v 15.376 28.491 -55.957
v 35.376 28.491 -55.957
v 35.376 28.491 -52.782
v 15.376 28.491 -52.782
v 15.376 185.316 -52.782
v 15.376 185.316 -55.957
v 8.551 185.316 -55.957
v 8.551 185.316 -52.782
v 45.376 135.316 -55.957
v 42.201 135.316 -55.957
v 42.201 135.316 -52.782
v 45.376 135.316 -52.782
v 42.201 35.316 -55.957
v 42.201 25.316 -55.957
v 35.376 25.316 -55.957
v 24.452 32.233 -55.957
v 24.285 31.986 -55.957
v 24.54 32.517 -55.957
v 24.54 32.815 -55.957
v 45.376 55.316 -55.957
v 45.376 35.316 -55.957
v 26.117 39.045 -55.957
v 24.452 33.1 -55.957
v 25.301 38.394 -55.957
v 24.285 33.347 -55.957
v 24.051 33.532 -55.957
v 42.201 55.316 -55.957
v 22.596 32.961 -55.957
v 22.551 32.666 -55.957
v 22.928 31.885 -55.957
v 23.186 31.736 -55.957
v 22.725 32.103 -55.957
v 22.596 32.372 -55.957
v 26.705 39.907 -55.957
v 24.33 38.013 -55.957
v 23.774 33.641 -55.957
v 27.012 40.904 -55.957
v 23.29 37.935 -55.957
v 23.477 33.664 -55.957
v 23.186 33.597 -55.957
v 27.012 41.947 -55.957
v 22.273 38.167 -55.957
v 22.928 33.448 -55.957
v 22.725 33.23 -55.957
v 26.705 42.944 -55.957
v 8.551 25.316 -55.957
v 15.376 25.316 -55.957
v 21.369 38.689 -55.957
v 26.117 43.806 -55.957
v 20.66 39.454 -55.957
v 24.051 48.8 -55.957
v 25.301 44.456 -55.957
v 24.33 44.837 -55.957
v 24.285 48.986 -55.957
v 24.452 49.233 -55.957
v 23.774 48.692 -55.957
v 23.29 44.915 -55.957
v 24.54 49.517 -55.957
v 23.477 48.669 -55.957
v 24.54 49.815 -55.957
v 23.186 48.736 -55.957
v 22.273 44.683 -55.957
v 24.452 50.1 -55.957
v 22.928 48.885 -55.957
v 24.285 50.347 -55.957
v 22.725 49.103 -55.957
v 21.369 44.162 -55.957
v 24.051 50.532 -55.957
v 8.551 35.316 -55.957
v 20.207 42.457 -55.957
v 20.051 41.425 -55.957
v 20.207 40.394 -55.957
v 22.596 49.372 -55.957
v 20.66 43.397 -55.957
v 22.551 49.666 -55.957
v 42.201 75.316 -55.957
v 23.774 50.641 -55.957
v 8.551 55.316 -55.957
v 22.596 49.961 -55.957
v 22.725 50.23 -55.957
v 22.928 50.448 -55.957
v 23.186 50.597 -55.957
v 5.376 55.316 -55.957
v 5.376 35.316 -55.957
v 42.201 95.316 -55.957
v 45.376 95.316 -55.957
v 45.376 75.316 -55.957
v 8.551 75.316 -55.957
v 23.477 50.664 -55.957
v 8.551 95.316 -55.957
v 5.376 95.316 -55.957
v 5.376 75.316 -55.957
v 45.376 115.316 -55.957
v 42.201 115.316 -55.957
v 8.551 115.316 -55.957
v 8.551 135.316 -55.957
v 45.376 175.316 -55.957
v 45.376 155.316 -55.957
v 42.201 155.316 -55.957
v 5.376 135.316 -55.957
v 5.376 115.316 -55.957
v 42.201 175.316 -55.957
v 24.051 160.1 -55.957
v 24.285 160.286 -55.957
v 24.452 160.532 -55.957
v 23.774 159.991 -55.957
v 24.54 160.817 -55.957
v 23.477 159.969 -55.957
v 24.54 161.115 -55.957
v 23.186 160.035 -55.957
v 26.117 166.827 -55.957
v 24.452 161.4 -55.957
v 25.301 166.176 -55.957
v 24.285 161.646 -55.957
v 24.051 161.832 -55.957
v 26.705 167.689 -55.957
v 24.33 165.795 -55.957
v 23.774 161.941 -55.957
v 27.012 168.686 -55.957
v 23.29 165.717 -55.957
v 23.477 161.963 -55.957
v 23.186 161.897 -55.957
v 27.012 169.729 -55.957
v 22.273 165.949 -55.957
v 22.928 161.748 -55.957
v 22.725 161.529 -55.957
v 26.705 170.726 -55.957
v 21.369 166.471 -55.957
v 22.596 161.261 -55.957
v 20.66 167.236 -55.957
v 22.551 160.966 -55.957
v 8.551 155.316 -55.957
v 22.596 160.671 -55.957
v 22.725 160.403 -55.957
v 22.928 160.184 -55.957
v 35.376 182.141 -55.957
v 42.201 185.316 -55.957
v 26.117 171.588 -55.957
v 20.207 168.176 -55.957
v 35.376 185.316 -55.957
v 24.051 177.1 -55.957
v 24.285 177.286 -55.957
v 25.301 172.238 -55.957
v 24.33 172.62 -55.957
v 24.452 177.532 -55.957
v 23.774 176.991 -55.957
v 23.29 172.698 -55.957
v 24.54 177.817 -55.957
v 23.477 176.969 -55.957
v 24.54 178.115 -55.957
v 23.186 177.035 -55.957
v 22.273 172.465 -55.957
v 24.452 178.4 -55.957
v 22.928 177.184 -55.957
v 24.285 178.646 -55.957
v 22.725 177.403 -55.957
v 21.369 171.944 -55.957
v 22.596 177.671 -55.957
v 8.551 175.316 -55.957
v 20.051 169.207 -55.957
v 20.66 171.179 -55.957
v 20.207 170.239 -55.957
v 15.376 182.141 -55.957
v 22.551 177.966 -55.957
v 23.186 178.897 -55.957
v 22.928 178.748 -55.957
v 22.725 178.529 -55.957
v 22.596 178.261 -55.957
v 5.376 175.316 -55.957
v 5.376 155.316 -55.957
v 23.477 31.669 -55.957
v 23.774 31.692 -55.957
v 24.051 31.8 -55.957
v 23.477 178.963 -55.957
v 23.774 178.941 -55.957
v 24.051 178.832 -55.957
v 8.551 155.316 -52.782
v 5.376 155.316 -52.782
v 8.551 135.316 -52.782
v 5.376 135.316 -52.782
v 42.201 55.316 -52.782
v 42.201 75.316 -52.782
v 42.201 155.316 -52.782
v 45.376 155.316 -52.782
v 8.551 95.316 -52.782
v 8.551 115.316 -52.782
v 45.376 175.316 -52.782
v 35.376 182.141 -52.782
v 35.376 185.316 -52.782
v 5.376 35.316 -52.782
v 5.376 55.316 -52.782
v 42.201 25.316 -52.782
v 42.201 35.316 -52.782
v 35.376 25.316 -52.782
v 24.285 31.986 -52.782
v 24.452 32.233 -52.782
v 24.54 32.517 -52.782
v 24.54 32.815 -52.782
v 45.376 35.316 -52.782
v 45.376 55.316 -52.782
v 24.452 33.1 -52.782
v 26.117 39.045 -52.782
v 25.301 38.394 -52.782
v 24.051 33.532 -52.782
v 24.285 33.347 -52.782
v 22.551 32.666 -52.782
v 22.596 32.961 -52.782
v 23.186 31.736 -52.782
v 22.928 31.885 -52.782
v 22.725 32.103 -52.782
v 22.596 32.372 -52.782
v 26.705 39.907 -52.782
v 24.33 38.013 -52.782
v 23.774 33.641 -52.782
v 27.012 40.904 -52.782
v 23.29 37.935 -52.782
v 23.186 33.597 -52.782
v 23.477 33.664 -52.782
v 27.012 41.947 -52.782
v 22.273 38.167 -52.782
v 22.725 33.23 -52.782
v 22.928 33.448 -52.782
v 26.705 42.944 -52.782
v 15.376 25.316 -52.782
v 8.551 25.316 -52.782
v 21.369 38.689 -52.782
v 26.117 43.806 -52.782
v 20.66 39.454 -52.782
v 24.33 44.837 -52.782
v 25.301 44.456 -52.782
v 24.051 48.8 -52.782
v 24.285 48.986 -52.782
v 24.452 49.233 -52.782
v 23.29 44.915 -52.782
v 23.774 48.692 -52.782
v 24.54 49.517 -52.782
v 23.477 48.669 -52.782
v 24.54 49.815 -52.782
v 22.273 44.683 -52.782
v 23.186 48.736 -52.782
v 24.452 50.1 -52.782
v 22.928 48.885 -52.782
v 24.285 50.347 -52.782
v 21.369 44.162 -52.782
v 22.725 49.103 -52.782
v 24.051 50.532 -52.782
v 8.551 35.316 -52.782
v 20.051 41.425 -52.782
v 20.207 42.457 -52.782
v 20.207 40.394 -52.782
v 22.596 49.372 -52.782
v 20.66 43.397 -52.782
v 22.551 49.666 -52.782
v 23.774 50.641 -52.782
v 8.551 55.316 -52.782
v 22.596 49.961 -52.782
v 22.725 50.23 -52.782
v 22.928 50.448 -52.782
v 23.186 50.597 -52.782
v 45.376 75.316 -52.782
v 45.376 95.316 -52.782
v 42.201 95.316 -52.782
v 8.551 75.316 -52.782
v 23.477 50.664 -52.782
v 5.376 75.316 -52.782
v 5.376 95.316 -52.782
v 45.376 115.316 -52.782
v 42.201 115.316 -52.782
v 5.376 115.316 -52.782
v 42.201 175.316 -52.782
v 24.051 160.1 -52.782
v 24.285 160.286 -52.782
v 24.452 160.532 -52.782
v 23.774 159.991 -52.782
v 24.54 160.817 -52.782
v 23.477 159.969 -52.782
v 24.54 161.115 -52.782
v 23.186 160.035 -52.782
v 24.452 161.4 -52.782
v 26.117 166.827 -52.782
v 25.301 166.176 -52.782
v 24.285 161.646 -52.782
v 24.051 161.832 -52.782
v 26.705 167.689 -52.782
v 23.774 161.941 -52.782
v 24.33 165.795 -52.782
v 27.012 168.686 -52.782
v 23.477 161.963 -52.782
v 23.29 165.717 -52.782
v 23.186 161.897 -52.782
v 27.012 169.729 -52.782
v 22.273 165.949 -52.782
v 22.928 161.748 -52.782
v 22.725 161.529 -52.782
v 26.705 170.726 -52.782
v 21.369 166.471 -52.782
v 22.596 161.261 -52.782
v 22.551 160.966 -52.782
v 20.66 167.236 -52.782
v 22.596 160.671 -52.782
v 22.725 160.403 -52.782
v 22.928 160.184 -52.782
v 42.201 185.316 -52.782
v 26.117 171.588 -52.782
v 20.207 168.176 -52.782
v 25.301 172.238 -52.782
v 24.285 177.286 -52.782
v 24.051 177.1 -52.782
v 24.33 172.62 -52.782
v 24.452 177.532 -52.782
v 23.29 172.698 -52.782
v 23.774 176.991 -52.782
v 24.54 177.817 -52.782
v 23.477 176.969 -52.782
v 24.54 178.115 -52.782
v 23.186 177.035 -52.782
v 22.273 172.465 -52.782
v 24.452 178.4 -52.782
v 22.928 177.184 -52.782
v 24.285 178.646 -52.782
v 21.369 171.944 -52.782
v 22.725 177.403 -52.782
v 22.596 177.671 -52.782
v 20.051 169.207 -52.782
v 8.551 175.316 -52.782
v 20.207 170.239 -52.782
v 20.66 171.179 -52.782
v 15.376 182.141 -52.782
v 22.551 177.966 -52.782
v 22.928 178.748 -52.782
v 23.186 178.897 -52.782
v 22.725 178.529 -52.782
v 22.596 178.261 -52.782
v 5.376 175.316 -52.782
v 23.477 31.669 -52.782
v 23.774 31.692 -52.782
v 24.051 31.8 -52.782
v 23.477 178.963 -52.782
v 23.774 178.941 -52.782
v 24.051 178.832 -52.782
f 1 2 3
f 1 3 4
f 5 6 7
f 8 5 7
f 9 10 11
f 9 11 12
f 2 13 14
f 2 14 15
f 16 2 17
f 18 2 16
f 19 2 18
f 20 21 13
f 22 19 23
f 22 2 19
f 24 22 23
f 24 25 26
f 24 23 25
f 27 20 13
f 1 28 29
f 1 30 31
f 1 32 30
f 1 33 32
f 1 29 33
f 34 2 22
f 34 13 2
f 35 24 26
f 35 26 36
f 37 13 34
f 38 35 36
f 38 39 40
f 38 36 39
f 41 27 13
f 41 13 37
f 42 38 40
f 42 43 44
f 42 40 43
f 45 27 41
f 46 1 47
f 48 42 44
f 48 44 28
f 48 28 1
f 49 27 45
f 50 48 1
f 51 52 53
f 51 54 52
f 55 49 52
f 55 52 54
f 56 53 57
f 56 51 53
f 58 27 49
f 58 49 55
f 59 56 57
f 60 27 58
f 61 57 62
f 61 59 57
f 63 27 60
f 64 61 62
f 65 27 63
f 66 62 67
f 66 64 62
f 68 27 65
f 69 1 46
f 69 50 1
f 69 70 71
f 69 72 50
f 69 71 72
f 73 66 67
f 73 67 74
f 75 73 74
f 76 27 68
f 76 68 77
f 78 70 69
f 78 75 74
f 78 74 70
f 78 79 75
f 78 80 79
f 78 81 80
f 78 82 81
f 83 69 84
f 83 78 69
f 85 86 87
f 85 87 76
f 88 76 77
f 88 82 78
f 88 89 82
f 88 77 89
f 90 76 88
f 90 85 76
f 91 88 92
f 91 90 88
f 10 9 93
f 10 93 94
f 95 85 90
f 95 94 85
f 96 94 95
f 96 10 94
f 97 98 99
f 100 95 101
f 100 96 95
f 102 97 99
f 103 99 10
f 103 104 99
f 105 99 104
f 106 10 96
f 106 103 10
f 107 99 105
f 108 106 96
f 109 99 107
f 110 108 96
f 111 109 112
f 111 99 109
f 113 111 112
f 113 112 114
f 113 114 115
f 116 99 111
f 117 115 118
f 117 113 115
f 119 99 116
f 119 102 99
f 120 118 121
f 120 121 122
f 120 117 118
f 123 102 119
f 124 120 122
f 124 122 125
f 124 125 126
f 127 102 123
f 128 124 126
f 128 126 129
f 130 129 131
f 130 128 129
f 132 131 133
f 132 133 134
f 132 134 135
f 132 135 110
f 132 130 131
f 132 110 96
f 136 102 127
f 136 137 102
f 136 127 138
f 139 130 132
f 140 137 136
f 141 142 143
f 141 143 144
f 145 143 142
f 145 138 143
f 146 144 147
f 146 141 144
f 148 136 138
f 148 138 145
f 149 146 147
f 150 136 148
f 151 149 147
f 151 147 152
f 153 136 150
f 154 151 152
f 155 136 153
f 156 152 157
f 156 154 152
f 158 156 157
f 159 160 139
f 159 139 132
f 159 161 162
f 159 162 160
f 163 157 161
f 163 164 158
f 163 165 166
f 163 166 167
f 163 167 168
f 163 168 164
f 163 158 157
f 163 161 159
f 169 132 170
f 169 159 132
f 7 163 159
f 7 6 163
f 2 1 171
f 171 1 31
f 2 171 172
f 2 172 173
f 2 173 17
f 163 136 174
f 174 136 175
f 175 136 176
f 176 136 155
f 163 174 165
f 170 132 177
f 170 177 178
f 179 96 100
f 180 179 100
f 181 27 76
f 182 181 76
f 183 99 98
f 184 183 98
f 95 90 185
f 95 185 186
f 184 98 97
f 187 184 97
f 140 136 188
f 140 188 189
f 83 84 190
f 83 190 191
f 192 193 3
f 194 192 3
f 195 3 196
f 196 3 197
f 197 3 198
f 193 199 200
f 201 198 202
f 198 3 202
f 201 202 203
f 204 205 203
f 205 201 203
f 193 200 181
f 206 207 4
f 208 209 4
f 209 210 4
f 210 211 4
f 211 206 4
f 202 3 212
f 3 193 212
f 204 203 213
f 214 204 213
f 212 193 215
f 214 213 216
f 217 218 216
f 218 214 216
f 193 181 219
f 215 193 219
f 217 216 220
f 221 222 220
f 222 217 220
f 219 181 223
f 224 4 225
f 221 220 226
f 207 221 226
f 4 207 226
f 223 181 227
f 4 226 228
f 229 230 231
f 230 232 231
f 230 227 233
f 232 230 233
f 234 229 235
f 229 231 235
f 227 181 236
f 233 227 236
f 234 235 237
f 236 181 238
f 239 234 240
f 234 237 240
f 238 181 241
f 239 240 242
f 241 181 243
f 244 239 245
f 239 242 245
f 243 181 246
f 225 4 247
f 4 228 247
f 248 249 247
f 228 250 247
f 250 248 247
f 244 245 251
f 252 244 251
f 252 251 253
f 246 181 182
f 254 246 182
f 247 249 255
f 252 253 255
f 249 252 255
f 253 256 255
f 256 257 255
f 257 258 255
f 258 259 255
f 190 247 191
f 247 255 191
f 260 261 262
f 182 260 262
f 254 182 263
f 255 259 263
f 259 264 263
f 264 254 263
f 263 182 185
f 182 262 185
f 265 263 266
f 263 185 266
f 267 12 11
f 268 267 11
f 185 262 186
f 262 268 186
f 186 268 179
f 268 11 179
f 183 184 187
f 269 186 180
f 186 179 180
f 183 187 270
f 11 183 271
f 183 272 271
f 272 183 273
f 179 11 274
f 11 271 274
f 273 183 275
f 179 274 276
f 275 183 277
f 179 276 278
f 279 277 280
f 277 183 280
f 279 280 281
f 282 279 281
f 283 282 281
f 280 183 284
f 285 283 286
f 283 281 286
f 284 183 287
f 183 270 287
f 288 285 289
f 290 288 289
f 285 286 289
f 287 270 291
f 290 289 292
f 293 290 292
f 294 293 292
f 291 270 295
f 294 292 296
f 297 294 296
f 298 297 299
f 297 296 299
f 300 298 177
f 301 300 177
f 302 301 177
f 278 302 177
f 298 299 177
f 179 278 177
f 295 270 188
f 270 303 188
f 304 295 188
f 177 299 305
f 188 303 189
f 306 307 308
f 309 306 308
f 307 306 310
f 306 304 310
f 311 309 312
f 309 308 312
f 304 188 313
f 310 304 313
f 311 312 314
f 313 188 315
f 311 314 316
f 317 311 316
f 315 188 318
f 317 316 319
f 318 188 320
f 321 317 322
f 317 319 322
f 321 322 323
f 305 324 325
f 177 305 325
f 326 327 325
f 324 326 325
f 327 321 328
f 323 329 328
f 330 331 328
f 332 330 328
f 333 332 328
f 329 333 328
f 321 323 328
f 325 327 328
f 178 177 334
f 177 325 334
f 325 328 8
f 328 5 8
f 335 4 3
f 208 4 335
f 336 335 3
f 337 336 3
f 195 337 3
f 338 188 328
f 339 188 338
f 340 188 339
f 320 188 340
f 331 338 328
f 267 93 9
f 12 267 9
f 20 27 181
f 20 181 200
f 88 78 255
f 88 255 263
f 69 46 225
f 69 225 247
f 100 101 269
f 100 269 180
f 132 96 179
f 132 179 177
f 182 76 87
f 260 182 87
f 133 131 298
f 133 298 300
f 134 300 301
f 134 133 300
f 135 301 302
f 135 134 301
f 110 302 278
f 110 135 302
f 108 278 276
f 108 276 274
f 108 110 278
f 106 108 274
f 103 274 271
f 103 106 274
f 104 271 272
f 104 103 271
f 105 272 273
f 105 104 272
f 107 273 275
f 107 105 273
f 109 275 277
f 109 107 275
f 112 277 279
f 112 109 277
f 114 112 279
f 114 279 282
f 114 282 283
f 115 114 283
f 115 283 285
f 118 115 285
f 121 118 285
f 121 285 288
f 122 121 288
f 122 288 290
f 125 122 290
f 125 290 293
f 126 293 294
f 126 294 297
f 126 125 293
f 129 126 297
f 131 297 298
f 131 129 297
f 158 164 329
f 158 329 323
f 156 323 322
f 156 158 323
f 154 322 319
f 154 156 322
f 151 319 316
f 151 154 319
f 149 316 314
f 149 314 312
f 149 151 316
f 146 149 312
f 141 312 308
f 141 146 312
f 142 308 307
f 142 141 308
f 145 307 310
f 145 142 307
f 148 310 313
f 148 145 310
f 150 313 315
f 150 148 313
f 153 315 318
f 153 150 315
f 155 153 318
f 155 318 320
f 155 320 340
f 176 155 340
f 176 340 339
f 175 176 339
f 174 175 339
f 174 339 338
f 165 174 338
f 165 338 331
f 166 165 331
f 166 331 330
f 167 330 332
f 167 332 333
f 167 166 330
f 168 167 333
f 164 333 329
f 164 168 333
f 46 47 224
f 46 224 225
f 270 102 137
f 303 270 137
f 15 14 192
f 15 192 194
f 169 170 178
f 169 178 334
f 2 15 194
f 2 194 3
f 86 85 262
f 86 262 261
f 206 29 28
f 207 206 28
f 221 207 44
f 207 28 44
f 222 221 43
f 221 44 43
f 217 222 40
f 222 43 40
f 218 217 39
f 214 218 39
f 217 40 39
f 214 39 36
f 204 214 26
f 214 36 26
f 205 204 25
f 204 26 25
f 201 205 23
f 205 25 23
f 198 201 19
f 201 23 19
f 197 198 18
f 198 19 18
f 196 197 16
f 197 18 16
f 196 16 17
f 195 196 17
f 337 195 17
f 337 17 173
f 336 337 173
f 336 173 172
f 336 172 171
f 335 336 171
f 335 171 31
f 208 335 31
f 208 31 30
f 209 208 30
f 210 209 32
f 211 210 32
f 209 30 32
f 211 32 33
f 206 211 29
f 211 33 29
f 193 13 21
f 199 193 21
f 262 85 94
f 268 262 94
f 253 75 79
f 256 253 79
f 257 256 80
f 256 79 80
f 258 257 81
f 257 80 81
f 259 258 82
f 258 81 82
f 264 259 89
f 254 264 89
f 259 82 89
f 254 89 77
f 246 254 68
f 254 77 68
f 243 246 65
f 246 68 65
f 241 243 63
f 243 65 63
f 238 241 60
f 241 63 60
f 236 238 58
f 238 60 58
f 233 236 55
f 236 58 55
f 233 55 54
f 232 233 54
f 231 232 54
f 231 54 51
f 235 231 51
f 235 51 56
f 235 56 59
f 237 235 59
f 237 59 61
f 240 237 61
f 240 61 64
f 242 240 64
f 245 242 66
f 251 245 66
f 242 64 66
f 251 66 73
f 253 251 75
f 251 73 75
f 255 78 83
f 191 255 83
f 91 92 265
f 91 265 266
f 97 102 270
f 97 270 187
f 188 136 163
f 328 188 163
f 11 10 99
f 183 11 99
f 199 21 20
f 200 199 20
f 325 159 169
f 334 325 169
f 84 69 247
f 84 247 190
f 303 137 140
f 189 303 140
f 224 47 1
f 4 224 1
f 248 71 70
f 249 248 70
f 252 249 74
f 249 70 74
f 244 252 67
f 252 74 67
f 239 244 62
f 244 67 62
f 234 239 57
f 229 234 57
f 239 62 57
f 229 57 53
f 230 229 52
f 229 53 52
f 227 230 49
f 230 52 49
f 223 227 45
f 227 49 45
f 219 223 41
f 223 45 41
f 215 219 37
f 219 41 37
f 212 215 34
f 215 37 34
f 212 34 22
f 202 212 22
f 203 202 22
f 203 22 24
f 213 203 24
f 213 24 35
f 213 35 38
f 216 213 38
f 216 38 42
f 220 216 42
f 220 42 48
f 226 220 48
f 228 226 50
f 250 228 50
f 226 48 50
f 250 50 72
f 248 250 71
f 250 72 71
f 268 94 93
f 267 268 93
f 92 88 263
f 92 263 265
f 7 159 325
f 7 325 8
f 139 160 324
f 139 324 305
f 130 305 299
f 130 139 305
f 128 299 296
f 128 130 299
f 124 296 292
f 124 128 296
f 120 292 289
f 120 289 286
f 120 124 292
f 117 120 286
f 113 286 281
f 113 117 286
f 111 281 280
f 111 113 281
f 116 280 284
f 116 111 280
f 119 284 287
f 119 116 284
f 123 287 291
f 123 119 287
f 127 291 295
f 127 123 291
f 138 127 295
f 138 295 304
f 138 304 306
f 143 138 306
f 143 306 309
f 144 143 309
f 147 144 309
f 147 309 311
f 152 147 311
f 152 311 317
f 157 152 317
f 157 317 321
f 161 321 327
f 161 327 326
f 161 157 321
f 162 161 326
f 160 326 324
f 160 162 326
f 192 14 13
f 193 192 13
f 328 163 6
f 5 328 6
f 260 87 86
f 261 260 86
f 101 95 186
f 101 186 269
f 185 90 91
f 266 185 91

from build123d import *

# Parameters (mm, degrees)
SKETCH1_W           = 40
SKETCH1_H           = 160
BOSS_EXTRUDE1_DEPTH = 3.175
SKETCH2_W           = 3.175
SKETCH2_H           = 10
SKETCH2_H_2         = 20
CUT_EXTRUDE1_DEPTH  = 3.175
SKETCH3_R           = 1
CUT_EXTRUDE2_DEPTH  = 3.175
SKETCH4_W           = 20
SKETCH4_H           = 3.175
CUT_EXTRUDE3_DEPTH  = 3.175
SKETCH5_R           = 3.5
CUT_EXTRUDE4_DEPTH  = 3.175


with BuildPart() as part:
    # Sketch1 → Boss-Extrude1 (new body)
    with BuildSketch(Plane(origin=(0, 0, -55.956765442), x_dir=(-1, 0, 0), z_dir=(0, 0, -1))):
        with Locations((-25.376465458, 105.316281379)):
            Rectangle(SKETCH1_W, SKETCH1_H)
    extrude(amount=-BOSS_EXTRUDE1_DEPTH)

    # Sketch2 → Cut-Extrude1 (cut)
    with BuildSketch(Plane(origin=(0, 0, -55.956765442), x_dir=(-1, 0, 0), z_dir=(0, 0, -1))):
        with Locations((-6.963965458, 180.316281379)):
            Rectangle(SKETCH2_W, SKETCH2_H)
        with Locations((-6.963965458, 145.316281379)):
            Rectangle(SKETCH2_W, SKETCH2_H_2)
        with Locations((-6.963965458, 105.316281379)):
            Rectangle(SKETCH2_W, SKETCH2_H_2)
        with Locations((-6.963965458, 65.316281379)):
            Rectangle(SKETCH2_W, SKETCH2_H_2)
        with Locations((-6.963965458, 30.316281379)):
            Rectangle(SKETCH2_W, SKETCH2_H)
    cut_extrude1 = extrude(amount=-CUT_EXTRUDE1_DEPTH, mode=Mode.SUBTRACT)

    # Sketch3 → Cut-Extrude2 (cut)
    with BuildSketch(Plane(origin=(0, 0, -55.956765442), x_dir=(-1, 0, 0), z_dir=(0, 0, -1))):
        with Locations((-23.551465458, 32.666436233)):
            Circle(SKETCH3_R)
        with Locations((-23.551465458, 49.666436233)):
            Circle(SKETCH3_R)
    cut_extrude2 = extrude(amount=-CUT_EXTRUDE2_DEPTH, mode=Mode.SUBTRACT)

    # Mirror1: Cut-Extrude1 across plane
    add(cut_extrude1.mirror(Plane.ZY.offset(-25.376465458)), mode=Mode.SUBTRACT)

    # Sketch4 → Cut-Extrude3 (cut)
    with BuildSketch(Plane(origin=(0, 0, -55.956765442), x_dir=(-1, 0, 0), z_dir=(0, 0, -1))):
        with Locations((-25.376465458, 26.903781379)):
            Rectangle(SKETCH4_W, SKETCH4_H)
        with Locations((-25.376465458, 183.728781379)):
            Rectangle(SKETCH4_W, SKETCH4_H)
    extrude(amount=-CUT_EXTRUDE3_DEPTH, mode=Mode.SUBTRACT)

    # Sketch5 → Cut-Extrude4 (cut)
    with BuildSketch(Plane(origin=(0, 0, -55.956765442), x_dir=(-1, 0, 0), z_dir=(0, 0, -1))):
        with Locations((-23.551465458, 41.425244037)):
            Circle(SKETCH5_R)
    cut_extrude4 = extrude(amount=-CUT_EXTRUDE4_DEPTH, mode=Mode.SUBTRACT)

    # Mirror2: Cut-Extrude2, Cut-Extrude4 across plane
    add(cut_extrude2.mirror(Plane(origin=(0, 105.316281379, 0), x_dir=(0, 0, 1), z_dir=(0, -1, 0))), mode=Mode.SUBTRACT)
    add(cut_extrude4.mirror(Plane(origin=(0, 105.316281379, 0), x_dir=(0, 0, 1), z_dir=(0, -1, 0))), mode=Mode.SUBTRACT)


solid = part.part
